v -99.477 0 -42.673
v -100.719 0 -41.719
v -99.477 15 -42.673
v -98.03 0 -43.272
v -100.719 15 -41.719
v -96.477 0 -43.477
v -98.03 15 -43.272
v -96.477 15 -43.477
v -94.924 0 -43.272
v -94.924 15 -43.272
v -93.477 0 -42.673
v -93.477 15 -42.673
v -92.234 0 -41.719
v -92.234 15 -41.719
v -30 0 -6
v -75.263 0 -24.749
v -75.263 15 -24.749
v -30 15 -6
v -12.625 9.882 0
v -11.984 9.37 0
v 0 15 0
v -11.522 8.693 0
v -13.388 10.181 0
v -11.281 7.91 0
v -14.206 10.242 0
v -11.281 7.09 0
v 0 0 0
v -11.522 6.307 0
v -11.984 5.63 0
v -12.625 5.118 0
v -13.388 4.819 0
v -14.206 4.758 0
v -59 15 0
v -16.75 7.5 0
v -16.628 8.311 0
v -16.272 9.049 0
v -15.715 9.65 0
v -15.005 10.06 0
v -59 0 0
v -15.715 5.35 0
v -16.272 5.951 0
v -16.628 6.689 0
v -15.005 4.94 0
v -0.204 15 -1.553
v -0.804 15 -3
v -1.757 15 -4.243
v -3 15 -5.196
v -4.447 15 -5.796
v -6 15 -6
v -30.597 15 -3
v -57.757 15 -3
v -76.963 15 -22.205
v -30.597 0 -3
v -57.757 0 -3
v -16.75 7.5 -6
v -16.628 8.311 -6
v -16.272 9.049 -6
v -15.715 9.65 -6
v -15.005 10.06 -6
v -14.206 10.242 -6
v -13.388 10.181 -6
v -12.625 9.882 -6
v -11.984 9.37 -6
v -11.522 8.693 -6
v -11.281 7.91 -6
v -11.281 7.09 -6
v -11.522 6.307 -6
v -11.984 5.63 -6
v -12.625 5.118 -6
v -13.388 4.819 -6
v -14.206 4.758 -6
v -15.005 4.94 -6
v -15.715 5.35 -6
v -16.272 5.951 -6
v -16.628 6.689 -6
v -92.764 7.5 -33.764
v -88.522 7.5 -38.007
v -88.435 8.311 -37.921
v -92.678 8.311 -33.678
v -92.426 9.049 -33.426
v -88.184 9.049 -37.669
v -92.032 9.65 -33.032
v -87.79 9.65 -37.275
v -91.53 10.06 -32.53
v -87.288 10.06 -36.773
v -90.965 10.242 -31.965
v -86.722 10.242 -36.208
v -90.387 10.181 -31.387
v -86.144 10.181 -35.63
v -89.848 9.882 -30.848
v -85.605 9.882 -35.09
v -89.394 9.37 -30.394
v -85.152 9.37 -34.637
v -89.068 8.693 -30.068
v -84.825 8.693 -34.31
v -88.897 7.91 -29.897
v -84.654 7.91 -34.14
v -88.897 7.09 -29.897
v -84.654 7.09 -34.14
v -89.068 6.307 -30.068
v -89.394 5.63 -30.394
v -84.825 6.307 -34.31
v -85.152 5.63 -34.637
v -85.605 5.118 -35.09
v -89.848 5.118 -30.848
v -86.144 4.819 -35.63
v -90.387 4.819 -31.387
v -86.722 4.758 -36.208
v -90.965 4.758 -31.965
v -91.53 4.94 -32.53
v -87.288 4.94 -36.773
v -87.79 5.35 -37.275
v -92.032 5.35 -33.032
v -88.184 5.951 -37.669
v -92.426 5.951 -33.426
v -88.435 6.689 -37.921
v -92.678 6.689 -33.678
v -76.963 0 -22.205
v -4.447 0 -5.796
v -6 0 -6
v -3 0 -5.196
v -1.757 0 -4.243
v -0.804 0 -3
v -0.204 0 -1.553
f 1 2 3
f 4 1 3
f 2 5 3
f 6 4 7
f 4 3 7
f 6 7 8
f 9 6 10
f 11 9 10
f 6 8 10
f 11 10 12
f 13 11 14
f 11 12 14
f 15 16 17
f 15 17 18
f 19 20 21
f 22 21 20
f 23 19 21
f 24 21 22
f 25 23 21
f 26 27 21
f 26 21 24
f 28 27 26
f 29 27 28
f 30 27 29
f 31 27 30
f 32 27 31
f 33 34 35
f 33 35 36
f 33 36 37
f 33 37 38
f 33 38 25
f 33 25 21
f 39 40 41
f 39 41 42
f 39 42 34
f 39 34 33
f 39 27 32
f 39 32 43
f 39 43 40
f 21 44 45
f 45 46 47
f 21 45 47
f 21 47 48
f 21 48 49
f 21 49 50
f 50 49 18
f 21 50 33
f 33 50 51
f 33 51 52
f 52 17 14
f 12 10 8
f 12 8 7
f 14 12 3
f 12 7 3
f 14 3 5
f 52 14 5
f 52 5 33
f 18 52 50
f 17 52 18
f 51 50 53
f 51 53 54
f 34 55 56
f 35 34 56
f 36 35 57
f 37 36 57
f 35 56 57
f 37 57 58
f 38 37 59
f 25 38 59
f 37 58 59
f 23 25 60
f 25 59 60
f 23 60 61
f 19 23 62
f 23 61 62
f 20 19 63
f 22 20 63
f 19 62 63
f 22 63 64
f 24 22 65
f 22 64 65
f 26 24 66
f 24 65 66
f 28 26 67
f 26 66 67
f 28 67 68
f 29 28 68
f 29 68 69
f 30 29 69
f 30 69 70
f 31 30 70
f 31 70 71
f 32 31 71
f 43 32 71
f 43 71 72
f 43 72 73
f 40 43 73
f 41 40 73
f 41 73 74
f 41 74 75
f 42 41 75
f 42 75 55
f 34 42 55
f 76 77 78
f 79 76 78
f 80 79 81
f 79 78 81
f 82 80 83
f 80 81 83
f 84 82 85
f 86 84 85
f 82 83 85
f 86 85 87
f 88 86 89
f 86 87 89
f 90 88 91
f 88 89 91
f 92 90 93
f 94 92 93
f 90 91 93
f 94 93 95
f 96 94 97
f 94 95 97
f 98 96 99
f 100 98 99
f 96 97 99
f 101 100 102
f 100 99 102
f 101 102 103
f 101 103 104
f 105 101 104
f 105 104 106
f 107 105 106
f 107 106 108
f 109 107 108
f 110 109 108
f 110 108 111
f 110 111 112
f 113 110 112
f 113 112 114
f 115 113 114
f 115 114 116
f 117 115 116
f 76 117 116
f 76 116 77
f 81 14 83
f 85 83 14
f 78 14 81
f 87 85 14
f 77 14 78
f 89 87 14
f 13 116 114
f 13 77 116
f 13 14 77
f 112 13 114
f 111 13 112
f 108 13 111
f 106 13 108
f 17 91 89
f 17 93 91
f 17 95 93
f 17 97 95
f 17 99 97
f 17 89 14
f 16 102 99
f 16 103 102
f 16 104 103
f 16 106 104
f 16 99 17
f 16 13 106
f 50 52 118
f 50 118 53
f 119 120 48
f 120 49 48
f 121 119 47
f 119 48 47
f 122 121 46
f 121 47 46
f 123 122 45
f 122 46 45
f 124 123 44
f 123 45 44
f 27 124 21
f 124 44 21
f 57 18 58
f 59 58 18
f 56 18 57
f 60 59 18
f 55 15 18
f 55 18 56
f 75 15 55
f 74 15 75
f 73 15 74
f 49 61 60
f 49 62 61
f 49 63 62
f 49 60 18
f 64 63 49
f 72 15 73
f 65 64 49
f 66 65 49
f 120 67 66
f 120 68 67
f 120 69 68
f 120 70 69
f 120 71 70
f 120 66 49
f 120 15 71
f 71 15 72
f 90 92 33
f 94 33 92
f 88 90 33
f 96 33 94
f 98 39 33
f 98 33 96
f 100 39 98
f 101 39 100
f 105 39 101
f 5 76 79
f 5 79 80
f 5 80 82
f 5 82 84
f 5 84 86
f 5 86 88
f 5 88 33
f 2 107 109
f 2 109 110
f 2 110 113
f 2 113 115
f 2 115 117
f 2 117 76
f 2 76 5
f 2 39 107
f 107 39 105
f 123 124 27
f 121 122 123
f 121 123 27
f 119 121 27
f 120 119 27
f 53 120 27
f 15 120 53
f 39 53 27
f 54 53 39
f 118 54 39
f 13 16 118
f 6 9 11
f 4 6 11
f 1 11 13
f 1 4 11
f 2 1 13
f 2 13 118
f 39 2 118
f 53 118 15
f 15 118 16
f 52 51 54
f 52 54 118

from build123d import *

# Parameters (mm, degrees)
BOSS_EXTRUDE1_DEPTH = 15
FILLET1_R           = 6
CUT_EXTRUDE1_DEPTH  = 111.72308217
SKETCH3_R           = 2.75
CUT_EXTRUDE2_DEPTH  = 109.507513635
SKETCH4_R           = 2.75
CUT_EXTRUDE3_DEPTH  = 104.169159776


with BuildPart() as part:
    # Sketch1 → Boss-Extrude1 (new body)
    with BuildSketch(Plane(origin=(0, 0, 0), x_dir=(1, 0, 0), z_dir=(0, 1, 0))):
        Polygon((0, 0), (-59, 0), (-100.71930009, 41.71930009), (-96.476659403, 45.961940777), (-75.263455967, 24.748737342), (-30, 6), (0, 6), align=None)
    extrude(amount=BOSS_EXTRUDE1_DEPTH)

    # Fillet1
    fillet1_edges = [part.edges().sort_by_distance(p)[0] for p in [
        (-96.476659403, 7.5, -45.961940777),
        (0, 7.5, -6),
    ]]
    fillet(fillet1_edges, radius=FILLET1_R - 0.0001)  # a hair under: the kernel refuses the full size

    # Sketch2 → Cut-Extrude1 (cut, through all)
    with BuildSketch(Plane(origin=(0, 15, 0), x_dir=(1, 0, 0), z_dir=(0, 1, 0))):
        Polygon((-76.962819459, 22.205460146), (-30.596737102, 3), (-57.757359313, 3), align=None)
    extrude(amount=-CUT_EXTRUDE1_DEPTH, mode=Mode.SUBTRACT)

    # Sketch3 → Cut-Extrude2 (cut, through all)
    with BuildSketch(Plane(origin=(0, 0, -6), x_dir=(-1, 0, 0), z_dir=(0, 0, -1))):
        with Locations((14, 7.5)):
            Circle(SKETCH3_R)
    extrude(amount=-CUT_EXTRUDE2_DEPTH, mode=Mode.SUBTRACT)

    # Sketch4 → Cut-Extrude3 (cut, through all)
    with BuildSketch(Plane(origin=(-25.257359313, 0, 25.257359313), x_dir=(-0.7071067811865465, 0, -0.7071067811865487), z_dir=(0.7071067811865487, 0, -0.7071067811865465))):
        with Locations((86.71930009, 7.5)):
            Circle(SKETCH4_R)
    extrude(amount=-CUT_EXTRUDE3_DEPTH, mode=Mode.SUBTRACT)


solid = part.part
